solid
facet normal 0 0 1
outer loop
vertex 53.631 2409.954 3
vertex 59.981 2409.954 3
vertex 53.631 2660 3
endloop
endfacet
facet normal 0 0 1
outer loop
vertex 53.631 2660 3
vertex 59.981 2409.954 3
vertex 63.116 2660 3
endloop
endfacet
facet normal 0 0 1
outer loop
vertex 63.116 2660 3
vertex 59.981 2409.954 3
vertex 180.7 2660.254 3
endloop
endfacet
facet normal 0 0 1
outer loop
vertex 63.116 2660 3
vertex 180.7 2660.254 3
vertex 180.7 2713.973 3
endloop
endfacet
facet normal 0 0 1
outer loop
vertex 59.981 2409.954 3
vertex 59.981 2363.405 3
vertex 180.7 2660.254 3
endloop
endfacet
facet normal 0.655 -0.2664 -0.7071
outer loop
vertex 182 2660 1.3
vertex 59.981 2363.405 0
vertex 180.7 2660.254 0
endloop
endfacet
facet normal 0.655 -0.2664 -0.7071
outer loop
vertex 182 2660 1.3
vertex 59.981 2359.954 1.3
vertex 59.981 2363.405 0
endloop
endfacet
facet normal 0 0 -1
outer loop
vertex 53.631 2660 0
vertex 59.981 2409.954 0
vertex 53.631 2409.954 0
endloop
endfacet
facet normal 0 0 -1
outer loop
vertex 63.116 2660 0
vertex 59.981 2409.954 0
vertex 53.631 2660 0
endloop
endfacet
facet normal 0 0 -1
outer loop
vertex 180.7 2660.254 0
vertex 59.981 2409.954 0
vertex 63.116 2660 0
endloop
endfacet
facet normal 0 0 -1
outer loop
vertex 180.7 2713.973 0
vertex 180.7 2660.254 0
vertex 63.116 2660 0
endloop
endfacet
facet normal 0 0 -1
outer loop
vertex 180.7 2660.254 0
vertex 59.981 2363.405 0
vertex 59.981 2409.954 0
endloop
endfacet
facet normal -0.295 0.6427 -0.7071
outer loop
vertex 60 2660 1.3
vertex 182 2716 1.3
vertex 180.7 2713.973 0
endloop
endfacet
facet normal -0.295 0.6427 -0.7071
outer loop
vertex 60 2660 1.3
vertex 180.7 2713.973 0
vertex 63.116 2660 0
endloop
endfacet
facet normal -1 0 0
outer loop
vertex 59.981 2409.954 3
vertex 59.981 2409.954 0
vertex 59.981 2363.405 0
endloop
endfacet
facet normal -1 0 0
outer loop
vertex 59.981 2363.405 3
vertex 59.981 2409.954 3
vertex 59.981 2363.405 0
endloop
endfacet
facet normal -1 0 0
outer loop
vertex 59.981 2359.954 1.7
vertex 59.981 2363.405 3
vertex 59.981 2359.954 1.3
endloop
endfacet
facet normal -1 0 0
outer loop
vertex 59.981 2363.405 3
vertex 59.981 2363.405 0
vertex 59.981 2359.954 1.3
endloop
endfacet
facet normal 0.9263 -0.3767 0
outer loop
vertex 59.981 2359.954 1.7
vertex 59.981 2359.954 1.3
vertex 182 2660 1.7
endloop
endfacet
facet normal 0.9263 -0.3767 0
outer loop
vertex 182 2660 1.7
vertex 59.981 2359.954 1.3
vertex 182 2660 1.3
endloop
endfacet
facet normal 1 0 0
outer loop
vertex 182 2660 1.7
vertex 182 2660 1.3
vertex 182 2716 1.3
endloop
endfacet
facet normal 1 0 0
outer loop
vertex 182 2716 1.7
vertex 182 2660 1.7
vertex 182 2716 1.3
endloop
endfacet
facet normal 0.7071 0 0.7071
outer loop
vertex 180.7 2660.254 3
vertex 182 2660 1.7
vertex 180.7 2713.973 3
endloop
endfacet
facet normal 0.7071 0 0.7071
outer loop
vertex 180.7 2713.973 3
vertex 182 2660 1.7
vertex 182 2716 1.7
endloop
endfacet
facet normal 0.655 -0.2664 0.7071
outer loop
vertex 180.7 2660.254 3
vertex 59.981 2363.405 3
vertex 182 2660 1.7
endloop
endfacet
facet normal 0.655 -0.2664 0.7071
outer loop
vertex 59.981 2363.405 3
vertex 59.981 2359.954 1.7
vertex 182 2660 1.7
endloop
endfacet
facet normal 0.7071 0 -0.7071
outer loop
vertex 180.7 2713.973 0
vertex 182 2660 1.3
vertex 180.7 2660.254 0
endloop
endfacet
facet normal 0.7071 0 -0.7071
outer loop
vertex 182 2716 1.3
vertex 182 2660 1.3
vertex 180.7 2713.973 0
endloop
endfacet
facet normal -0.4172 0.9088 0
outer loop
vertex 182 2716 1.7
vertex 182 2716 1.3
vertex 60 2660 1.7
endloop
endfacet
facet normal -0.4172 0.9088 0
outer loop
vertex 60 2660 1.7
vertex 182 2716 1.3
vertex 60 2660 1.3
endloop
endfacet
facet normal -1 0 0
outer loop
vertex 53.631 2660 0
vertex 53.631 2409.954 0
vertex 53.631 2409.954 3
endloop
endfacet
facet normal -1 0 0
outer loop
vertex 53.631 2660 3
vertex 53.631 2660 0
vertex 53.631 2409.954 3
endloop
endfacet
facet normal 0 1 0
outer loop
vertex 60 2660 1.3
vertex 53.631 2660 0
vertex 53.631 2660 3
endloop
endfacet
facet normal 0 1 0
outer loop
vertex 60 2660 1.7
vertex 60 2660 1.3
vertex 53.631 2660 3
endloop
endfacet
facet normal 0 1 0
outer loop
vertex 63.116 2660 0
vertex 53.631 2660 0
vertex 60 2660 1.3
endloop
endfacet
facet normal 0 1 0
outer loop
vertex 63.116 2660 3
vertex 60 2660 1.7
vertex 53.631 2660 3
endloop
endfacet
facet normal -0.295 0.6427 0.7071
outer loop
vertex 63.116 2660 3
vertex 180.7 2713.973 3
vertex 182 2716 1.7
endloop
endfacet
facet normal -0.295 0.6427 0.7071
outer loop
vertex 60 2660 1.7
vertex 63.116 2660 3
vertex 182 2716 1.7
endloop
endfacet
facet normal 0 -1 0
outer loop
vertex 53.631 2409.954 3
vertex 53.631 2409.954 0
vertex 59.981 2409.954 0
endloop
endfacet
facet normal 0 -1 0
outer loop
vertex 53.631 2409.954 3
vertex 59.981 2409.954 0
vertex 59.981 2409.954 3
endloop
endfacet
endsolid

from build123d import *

# Parameters (mm, degrees)
BOSS_EXTRUDE1_DEPTH = 3
SKETCH2_W           = 3
SKETCH2_H           = 250.046113764
BOSS_EXTRUDE2_DEPTH = 6.35
CHAMFER1_SIZE       = 1.3
CHAMFER2_SIZE       = 1.3
CHAMFER3_SIZE       = 1.3


with BuildPart() as part:
    # Sketch1 → Boss-Extrude1 (new body)
    with BuildSketch(Plane.XY):
        Polygon((60, 2660), (59.981247069, 2660), (59.981247069, 2359.953886236), (182, 2660), (182, 2716), align=None)
    extrude(amount=BOSS_EXTRUDE1_DEPTH)

    # Sketch2 → Boss-Extrude2 (add)
    with BuildSketch(Plane.ZY.offset(-59.981247069)):
        with Locations((1.5, 2534.976943118)):
            Rectangle(SKETCH2_W, SKETCH2_H)
    extrude(amount=BOSS_EXTRUDE2_DEPTH)

    # Chamfer1
    chamfer1_edges = [part.edges().sort_by_distance(p)[0] for p in [
        (120.990623535, 2509.976943118, 3),
        (120.990623535, 2509.976943118, 0),
    ]]
    chamfer(chamfer1_edges, length=CHAMFER1_SIZE)

    # Chamfer2
    chamfer2_edges = [part.edges().sort_by_distance(p)[0] for p in [
        (121, 2688, 3),
        (121, 2688, 0),
    ]]
    chamfer(chamfer2_edges, length=CHAMFER2_SIZE)

    # Chamfer3
    chamfer3_edges = [part.edges().sort_by_distance(p)[0] for p in [
        (182, 2689.010267295, 0),
        (182, 2689.010267295, 3),
    ]]
    chamfer(chamfer3_edges, length=CHAMFER3_SIZE)


solid = part.part
